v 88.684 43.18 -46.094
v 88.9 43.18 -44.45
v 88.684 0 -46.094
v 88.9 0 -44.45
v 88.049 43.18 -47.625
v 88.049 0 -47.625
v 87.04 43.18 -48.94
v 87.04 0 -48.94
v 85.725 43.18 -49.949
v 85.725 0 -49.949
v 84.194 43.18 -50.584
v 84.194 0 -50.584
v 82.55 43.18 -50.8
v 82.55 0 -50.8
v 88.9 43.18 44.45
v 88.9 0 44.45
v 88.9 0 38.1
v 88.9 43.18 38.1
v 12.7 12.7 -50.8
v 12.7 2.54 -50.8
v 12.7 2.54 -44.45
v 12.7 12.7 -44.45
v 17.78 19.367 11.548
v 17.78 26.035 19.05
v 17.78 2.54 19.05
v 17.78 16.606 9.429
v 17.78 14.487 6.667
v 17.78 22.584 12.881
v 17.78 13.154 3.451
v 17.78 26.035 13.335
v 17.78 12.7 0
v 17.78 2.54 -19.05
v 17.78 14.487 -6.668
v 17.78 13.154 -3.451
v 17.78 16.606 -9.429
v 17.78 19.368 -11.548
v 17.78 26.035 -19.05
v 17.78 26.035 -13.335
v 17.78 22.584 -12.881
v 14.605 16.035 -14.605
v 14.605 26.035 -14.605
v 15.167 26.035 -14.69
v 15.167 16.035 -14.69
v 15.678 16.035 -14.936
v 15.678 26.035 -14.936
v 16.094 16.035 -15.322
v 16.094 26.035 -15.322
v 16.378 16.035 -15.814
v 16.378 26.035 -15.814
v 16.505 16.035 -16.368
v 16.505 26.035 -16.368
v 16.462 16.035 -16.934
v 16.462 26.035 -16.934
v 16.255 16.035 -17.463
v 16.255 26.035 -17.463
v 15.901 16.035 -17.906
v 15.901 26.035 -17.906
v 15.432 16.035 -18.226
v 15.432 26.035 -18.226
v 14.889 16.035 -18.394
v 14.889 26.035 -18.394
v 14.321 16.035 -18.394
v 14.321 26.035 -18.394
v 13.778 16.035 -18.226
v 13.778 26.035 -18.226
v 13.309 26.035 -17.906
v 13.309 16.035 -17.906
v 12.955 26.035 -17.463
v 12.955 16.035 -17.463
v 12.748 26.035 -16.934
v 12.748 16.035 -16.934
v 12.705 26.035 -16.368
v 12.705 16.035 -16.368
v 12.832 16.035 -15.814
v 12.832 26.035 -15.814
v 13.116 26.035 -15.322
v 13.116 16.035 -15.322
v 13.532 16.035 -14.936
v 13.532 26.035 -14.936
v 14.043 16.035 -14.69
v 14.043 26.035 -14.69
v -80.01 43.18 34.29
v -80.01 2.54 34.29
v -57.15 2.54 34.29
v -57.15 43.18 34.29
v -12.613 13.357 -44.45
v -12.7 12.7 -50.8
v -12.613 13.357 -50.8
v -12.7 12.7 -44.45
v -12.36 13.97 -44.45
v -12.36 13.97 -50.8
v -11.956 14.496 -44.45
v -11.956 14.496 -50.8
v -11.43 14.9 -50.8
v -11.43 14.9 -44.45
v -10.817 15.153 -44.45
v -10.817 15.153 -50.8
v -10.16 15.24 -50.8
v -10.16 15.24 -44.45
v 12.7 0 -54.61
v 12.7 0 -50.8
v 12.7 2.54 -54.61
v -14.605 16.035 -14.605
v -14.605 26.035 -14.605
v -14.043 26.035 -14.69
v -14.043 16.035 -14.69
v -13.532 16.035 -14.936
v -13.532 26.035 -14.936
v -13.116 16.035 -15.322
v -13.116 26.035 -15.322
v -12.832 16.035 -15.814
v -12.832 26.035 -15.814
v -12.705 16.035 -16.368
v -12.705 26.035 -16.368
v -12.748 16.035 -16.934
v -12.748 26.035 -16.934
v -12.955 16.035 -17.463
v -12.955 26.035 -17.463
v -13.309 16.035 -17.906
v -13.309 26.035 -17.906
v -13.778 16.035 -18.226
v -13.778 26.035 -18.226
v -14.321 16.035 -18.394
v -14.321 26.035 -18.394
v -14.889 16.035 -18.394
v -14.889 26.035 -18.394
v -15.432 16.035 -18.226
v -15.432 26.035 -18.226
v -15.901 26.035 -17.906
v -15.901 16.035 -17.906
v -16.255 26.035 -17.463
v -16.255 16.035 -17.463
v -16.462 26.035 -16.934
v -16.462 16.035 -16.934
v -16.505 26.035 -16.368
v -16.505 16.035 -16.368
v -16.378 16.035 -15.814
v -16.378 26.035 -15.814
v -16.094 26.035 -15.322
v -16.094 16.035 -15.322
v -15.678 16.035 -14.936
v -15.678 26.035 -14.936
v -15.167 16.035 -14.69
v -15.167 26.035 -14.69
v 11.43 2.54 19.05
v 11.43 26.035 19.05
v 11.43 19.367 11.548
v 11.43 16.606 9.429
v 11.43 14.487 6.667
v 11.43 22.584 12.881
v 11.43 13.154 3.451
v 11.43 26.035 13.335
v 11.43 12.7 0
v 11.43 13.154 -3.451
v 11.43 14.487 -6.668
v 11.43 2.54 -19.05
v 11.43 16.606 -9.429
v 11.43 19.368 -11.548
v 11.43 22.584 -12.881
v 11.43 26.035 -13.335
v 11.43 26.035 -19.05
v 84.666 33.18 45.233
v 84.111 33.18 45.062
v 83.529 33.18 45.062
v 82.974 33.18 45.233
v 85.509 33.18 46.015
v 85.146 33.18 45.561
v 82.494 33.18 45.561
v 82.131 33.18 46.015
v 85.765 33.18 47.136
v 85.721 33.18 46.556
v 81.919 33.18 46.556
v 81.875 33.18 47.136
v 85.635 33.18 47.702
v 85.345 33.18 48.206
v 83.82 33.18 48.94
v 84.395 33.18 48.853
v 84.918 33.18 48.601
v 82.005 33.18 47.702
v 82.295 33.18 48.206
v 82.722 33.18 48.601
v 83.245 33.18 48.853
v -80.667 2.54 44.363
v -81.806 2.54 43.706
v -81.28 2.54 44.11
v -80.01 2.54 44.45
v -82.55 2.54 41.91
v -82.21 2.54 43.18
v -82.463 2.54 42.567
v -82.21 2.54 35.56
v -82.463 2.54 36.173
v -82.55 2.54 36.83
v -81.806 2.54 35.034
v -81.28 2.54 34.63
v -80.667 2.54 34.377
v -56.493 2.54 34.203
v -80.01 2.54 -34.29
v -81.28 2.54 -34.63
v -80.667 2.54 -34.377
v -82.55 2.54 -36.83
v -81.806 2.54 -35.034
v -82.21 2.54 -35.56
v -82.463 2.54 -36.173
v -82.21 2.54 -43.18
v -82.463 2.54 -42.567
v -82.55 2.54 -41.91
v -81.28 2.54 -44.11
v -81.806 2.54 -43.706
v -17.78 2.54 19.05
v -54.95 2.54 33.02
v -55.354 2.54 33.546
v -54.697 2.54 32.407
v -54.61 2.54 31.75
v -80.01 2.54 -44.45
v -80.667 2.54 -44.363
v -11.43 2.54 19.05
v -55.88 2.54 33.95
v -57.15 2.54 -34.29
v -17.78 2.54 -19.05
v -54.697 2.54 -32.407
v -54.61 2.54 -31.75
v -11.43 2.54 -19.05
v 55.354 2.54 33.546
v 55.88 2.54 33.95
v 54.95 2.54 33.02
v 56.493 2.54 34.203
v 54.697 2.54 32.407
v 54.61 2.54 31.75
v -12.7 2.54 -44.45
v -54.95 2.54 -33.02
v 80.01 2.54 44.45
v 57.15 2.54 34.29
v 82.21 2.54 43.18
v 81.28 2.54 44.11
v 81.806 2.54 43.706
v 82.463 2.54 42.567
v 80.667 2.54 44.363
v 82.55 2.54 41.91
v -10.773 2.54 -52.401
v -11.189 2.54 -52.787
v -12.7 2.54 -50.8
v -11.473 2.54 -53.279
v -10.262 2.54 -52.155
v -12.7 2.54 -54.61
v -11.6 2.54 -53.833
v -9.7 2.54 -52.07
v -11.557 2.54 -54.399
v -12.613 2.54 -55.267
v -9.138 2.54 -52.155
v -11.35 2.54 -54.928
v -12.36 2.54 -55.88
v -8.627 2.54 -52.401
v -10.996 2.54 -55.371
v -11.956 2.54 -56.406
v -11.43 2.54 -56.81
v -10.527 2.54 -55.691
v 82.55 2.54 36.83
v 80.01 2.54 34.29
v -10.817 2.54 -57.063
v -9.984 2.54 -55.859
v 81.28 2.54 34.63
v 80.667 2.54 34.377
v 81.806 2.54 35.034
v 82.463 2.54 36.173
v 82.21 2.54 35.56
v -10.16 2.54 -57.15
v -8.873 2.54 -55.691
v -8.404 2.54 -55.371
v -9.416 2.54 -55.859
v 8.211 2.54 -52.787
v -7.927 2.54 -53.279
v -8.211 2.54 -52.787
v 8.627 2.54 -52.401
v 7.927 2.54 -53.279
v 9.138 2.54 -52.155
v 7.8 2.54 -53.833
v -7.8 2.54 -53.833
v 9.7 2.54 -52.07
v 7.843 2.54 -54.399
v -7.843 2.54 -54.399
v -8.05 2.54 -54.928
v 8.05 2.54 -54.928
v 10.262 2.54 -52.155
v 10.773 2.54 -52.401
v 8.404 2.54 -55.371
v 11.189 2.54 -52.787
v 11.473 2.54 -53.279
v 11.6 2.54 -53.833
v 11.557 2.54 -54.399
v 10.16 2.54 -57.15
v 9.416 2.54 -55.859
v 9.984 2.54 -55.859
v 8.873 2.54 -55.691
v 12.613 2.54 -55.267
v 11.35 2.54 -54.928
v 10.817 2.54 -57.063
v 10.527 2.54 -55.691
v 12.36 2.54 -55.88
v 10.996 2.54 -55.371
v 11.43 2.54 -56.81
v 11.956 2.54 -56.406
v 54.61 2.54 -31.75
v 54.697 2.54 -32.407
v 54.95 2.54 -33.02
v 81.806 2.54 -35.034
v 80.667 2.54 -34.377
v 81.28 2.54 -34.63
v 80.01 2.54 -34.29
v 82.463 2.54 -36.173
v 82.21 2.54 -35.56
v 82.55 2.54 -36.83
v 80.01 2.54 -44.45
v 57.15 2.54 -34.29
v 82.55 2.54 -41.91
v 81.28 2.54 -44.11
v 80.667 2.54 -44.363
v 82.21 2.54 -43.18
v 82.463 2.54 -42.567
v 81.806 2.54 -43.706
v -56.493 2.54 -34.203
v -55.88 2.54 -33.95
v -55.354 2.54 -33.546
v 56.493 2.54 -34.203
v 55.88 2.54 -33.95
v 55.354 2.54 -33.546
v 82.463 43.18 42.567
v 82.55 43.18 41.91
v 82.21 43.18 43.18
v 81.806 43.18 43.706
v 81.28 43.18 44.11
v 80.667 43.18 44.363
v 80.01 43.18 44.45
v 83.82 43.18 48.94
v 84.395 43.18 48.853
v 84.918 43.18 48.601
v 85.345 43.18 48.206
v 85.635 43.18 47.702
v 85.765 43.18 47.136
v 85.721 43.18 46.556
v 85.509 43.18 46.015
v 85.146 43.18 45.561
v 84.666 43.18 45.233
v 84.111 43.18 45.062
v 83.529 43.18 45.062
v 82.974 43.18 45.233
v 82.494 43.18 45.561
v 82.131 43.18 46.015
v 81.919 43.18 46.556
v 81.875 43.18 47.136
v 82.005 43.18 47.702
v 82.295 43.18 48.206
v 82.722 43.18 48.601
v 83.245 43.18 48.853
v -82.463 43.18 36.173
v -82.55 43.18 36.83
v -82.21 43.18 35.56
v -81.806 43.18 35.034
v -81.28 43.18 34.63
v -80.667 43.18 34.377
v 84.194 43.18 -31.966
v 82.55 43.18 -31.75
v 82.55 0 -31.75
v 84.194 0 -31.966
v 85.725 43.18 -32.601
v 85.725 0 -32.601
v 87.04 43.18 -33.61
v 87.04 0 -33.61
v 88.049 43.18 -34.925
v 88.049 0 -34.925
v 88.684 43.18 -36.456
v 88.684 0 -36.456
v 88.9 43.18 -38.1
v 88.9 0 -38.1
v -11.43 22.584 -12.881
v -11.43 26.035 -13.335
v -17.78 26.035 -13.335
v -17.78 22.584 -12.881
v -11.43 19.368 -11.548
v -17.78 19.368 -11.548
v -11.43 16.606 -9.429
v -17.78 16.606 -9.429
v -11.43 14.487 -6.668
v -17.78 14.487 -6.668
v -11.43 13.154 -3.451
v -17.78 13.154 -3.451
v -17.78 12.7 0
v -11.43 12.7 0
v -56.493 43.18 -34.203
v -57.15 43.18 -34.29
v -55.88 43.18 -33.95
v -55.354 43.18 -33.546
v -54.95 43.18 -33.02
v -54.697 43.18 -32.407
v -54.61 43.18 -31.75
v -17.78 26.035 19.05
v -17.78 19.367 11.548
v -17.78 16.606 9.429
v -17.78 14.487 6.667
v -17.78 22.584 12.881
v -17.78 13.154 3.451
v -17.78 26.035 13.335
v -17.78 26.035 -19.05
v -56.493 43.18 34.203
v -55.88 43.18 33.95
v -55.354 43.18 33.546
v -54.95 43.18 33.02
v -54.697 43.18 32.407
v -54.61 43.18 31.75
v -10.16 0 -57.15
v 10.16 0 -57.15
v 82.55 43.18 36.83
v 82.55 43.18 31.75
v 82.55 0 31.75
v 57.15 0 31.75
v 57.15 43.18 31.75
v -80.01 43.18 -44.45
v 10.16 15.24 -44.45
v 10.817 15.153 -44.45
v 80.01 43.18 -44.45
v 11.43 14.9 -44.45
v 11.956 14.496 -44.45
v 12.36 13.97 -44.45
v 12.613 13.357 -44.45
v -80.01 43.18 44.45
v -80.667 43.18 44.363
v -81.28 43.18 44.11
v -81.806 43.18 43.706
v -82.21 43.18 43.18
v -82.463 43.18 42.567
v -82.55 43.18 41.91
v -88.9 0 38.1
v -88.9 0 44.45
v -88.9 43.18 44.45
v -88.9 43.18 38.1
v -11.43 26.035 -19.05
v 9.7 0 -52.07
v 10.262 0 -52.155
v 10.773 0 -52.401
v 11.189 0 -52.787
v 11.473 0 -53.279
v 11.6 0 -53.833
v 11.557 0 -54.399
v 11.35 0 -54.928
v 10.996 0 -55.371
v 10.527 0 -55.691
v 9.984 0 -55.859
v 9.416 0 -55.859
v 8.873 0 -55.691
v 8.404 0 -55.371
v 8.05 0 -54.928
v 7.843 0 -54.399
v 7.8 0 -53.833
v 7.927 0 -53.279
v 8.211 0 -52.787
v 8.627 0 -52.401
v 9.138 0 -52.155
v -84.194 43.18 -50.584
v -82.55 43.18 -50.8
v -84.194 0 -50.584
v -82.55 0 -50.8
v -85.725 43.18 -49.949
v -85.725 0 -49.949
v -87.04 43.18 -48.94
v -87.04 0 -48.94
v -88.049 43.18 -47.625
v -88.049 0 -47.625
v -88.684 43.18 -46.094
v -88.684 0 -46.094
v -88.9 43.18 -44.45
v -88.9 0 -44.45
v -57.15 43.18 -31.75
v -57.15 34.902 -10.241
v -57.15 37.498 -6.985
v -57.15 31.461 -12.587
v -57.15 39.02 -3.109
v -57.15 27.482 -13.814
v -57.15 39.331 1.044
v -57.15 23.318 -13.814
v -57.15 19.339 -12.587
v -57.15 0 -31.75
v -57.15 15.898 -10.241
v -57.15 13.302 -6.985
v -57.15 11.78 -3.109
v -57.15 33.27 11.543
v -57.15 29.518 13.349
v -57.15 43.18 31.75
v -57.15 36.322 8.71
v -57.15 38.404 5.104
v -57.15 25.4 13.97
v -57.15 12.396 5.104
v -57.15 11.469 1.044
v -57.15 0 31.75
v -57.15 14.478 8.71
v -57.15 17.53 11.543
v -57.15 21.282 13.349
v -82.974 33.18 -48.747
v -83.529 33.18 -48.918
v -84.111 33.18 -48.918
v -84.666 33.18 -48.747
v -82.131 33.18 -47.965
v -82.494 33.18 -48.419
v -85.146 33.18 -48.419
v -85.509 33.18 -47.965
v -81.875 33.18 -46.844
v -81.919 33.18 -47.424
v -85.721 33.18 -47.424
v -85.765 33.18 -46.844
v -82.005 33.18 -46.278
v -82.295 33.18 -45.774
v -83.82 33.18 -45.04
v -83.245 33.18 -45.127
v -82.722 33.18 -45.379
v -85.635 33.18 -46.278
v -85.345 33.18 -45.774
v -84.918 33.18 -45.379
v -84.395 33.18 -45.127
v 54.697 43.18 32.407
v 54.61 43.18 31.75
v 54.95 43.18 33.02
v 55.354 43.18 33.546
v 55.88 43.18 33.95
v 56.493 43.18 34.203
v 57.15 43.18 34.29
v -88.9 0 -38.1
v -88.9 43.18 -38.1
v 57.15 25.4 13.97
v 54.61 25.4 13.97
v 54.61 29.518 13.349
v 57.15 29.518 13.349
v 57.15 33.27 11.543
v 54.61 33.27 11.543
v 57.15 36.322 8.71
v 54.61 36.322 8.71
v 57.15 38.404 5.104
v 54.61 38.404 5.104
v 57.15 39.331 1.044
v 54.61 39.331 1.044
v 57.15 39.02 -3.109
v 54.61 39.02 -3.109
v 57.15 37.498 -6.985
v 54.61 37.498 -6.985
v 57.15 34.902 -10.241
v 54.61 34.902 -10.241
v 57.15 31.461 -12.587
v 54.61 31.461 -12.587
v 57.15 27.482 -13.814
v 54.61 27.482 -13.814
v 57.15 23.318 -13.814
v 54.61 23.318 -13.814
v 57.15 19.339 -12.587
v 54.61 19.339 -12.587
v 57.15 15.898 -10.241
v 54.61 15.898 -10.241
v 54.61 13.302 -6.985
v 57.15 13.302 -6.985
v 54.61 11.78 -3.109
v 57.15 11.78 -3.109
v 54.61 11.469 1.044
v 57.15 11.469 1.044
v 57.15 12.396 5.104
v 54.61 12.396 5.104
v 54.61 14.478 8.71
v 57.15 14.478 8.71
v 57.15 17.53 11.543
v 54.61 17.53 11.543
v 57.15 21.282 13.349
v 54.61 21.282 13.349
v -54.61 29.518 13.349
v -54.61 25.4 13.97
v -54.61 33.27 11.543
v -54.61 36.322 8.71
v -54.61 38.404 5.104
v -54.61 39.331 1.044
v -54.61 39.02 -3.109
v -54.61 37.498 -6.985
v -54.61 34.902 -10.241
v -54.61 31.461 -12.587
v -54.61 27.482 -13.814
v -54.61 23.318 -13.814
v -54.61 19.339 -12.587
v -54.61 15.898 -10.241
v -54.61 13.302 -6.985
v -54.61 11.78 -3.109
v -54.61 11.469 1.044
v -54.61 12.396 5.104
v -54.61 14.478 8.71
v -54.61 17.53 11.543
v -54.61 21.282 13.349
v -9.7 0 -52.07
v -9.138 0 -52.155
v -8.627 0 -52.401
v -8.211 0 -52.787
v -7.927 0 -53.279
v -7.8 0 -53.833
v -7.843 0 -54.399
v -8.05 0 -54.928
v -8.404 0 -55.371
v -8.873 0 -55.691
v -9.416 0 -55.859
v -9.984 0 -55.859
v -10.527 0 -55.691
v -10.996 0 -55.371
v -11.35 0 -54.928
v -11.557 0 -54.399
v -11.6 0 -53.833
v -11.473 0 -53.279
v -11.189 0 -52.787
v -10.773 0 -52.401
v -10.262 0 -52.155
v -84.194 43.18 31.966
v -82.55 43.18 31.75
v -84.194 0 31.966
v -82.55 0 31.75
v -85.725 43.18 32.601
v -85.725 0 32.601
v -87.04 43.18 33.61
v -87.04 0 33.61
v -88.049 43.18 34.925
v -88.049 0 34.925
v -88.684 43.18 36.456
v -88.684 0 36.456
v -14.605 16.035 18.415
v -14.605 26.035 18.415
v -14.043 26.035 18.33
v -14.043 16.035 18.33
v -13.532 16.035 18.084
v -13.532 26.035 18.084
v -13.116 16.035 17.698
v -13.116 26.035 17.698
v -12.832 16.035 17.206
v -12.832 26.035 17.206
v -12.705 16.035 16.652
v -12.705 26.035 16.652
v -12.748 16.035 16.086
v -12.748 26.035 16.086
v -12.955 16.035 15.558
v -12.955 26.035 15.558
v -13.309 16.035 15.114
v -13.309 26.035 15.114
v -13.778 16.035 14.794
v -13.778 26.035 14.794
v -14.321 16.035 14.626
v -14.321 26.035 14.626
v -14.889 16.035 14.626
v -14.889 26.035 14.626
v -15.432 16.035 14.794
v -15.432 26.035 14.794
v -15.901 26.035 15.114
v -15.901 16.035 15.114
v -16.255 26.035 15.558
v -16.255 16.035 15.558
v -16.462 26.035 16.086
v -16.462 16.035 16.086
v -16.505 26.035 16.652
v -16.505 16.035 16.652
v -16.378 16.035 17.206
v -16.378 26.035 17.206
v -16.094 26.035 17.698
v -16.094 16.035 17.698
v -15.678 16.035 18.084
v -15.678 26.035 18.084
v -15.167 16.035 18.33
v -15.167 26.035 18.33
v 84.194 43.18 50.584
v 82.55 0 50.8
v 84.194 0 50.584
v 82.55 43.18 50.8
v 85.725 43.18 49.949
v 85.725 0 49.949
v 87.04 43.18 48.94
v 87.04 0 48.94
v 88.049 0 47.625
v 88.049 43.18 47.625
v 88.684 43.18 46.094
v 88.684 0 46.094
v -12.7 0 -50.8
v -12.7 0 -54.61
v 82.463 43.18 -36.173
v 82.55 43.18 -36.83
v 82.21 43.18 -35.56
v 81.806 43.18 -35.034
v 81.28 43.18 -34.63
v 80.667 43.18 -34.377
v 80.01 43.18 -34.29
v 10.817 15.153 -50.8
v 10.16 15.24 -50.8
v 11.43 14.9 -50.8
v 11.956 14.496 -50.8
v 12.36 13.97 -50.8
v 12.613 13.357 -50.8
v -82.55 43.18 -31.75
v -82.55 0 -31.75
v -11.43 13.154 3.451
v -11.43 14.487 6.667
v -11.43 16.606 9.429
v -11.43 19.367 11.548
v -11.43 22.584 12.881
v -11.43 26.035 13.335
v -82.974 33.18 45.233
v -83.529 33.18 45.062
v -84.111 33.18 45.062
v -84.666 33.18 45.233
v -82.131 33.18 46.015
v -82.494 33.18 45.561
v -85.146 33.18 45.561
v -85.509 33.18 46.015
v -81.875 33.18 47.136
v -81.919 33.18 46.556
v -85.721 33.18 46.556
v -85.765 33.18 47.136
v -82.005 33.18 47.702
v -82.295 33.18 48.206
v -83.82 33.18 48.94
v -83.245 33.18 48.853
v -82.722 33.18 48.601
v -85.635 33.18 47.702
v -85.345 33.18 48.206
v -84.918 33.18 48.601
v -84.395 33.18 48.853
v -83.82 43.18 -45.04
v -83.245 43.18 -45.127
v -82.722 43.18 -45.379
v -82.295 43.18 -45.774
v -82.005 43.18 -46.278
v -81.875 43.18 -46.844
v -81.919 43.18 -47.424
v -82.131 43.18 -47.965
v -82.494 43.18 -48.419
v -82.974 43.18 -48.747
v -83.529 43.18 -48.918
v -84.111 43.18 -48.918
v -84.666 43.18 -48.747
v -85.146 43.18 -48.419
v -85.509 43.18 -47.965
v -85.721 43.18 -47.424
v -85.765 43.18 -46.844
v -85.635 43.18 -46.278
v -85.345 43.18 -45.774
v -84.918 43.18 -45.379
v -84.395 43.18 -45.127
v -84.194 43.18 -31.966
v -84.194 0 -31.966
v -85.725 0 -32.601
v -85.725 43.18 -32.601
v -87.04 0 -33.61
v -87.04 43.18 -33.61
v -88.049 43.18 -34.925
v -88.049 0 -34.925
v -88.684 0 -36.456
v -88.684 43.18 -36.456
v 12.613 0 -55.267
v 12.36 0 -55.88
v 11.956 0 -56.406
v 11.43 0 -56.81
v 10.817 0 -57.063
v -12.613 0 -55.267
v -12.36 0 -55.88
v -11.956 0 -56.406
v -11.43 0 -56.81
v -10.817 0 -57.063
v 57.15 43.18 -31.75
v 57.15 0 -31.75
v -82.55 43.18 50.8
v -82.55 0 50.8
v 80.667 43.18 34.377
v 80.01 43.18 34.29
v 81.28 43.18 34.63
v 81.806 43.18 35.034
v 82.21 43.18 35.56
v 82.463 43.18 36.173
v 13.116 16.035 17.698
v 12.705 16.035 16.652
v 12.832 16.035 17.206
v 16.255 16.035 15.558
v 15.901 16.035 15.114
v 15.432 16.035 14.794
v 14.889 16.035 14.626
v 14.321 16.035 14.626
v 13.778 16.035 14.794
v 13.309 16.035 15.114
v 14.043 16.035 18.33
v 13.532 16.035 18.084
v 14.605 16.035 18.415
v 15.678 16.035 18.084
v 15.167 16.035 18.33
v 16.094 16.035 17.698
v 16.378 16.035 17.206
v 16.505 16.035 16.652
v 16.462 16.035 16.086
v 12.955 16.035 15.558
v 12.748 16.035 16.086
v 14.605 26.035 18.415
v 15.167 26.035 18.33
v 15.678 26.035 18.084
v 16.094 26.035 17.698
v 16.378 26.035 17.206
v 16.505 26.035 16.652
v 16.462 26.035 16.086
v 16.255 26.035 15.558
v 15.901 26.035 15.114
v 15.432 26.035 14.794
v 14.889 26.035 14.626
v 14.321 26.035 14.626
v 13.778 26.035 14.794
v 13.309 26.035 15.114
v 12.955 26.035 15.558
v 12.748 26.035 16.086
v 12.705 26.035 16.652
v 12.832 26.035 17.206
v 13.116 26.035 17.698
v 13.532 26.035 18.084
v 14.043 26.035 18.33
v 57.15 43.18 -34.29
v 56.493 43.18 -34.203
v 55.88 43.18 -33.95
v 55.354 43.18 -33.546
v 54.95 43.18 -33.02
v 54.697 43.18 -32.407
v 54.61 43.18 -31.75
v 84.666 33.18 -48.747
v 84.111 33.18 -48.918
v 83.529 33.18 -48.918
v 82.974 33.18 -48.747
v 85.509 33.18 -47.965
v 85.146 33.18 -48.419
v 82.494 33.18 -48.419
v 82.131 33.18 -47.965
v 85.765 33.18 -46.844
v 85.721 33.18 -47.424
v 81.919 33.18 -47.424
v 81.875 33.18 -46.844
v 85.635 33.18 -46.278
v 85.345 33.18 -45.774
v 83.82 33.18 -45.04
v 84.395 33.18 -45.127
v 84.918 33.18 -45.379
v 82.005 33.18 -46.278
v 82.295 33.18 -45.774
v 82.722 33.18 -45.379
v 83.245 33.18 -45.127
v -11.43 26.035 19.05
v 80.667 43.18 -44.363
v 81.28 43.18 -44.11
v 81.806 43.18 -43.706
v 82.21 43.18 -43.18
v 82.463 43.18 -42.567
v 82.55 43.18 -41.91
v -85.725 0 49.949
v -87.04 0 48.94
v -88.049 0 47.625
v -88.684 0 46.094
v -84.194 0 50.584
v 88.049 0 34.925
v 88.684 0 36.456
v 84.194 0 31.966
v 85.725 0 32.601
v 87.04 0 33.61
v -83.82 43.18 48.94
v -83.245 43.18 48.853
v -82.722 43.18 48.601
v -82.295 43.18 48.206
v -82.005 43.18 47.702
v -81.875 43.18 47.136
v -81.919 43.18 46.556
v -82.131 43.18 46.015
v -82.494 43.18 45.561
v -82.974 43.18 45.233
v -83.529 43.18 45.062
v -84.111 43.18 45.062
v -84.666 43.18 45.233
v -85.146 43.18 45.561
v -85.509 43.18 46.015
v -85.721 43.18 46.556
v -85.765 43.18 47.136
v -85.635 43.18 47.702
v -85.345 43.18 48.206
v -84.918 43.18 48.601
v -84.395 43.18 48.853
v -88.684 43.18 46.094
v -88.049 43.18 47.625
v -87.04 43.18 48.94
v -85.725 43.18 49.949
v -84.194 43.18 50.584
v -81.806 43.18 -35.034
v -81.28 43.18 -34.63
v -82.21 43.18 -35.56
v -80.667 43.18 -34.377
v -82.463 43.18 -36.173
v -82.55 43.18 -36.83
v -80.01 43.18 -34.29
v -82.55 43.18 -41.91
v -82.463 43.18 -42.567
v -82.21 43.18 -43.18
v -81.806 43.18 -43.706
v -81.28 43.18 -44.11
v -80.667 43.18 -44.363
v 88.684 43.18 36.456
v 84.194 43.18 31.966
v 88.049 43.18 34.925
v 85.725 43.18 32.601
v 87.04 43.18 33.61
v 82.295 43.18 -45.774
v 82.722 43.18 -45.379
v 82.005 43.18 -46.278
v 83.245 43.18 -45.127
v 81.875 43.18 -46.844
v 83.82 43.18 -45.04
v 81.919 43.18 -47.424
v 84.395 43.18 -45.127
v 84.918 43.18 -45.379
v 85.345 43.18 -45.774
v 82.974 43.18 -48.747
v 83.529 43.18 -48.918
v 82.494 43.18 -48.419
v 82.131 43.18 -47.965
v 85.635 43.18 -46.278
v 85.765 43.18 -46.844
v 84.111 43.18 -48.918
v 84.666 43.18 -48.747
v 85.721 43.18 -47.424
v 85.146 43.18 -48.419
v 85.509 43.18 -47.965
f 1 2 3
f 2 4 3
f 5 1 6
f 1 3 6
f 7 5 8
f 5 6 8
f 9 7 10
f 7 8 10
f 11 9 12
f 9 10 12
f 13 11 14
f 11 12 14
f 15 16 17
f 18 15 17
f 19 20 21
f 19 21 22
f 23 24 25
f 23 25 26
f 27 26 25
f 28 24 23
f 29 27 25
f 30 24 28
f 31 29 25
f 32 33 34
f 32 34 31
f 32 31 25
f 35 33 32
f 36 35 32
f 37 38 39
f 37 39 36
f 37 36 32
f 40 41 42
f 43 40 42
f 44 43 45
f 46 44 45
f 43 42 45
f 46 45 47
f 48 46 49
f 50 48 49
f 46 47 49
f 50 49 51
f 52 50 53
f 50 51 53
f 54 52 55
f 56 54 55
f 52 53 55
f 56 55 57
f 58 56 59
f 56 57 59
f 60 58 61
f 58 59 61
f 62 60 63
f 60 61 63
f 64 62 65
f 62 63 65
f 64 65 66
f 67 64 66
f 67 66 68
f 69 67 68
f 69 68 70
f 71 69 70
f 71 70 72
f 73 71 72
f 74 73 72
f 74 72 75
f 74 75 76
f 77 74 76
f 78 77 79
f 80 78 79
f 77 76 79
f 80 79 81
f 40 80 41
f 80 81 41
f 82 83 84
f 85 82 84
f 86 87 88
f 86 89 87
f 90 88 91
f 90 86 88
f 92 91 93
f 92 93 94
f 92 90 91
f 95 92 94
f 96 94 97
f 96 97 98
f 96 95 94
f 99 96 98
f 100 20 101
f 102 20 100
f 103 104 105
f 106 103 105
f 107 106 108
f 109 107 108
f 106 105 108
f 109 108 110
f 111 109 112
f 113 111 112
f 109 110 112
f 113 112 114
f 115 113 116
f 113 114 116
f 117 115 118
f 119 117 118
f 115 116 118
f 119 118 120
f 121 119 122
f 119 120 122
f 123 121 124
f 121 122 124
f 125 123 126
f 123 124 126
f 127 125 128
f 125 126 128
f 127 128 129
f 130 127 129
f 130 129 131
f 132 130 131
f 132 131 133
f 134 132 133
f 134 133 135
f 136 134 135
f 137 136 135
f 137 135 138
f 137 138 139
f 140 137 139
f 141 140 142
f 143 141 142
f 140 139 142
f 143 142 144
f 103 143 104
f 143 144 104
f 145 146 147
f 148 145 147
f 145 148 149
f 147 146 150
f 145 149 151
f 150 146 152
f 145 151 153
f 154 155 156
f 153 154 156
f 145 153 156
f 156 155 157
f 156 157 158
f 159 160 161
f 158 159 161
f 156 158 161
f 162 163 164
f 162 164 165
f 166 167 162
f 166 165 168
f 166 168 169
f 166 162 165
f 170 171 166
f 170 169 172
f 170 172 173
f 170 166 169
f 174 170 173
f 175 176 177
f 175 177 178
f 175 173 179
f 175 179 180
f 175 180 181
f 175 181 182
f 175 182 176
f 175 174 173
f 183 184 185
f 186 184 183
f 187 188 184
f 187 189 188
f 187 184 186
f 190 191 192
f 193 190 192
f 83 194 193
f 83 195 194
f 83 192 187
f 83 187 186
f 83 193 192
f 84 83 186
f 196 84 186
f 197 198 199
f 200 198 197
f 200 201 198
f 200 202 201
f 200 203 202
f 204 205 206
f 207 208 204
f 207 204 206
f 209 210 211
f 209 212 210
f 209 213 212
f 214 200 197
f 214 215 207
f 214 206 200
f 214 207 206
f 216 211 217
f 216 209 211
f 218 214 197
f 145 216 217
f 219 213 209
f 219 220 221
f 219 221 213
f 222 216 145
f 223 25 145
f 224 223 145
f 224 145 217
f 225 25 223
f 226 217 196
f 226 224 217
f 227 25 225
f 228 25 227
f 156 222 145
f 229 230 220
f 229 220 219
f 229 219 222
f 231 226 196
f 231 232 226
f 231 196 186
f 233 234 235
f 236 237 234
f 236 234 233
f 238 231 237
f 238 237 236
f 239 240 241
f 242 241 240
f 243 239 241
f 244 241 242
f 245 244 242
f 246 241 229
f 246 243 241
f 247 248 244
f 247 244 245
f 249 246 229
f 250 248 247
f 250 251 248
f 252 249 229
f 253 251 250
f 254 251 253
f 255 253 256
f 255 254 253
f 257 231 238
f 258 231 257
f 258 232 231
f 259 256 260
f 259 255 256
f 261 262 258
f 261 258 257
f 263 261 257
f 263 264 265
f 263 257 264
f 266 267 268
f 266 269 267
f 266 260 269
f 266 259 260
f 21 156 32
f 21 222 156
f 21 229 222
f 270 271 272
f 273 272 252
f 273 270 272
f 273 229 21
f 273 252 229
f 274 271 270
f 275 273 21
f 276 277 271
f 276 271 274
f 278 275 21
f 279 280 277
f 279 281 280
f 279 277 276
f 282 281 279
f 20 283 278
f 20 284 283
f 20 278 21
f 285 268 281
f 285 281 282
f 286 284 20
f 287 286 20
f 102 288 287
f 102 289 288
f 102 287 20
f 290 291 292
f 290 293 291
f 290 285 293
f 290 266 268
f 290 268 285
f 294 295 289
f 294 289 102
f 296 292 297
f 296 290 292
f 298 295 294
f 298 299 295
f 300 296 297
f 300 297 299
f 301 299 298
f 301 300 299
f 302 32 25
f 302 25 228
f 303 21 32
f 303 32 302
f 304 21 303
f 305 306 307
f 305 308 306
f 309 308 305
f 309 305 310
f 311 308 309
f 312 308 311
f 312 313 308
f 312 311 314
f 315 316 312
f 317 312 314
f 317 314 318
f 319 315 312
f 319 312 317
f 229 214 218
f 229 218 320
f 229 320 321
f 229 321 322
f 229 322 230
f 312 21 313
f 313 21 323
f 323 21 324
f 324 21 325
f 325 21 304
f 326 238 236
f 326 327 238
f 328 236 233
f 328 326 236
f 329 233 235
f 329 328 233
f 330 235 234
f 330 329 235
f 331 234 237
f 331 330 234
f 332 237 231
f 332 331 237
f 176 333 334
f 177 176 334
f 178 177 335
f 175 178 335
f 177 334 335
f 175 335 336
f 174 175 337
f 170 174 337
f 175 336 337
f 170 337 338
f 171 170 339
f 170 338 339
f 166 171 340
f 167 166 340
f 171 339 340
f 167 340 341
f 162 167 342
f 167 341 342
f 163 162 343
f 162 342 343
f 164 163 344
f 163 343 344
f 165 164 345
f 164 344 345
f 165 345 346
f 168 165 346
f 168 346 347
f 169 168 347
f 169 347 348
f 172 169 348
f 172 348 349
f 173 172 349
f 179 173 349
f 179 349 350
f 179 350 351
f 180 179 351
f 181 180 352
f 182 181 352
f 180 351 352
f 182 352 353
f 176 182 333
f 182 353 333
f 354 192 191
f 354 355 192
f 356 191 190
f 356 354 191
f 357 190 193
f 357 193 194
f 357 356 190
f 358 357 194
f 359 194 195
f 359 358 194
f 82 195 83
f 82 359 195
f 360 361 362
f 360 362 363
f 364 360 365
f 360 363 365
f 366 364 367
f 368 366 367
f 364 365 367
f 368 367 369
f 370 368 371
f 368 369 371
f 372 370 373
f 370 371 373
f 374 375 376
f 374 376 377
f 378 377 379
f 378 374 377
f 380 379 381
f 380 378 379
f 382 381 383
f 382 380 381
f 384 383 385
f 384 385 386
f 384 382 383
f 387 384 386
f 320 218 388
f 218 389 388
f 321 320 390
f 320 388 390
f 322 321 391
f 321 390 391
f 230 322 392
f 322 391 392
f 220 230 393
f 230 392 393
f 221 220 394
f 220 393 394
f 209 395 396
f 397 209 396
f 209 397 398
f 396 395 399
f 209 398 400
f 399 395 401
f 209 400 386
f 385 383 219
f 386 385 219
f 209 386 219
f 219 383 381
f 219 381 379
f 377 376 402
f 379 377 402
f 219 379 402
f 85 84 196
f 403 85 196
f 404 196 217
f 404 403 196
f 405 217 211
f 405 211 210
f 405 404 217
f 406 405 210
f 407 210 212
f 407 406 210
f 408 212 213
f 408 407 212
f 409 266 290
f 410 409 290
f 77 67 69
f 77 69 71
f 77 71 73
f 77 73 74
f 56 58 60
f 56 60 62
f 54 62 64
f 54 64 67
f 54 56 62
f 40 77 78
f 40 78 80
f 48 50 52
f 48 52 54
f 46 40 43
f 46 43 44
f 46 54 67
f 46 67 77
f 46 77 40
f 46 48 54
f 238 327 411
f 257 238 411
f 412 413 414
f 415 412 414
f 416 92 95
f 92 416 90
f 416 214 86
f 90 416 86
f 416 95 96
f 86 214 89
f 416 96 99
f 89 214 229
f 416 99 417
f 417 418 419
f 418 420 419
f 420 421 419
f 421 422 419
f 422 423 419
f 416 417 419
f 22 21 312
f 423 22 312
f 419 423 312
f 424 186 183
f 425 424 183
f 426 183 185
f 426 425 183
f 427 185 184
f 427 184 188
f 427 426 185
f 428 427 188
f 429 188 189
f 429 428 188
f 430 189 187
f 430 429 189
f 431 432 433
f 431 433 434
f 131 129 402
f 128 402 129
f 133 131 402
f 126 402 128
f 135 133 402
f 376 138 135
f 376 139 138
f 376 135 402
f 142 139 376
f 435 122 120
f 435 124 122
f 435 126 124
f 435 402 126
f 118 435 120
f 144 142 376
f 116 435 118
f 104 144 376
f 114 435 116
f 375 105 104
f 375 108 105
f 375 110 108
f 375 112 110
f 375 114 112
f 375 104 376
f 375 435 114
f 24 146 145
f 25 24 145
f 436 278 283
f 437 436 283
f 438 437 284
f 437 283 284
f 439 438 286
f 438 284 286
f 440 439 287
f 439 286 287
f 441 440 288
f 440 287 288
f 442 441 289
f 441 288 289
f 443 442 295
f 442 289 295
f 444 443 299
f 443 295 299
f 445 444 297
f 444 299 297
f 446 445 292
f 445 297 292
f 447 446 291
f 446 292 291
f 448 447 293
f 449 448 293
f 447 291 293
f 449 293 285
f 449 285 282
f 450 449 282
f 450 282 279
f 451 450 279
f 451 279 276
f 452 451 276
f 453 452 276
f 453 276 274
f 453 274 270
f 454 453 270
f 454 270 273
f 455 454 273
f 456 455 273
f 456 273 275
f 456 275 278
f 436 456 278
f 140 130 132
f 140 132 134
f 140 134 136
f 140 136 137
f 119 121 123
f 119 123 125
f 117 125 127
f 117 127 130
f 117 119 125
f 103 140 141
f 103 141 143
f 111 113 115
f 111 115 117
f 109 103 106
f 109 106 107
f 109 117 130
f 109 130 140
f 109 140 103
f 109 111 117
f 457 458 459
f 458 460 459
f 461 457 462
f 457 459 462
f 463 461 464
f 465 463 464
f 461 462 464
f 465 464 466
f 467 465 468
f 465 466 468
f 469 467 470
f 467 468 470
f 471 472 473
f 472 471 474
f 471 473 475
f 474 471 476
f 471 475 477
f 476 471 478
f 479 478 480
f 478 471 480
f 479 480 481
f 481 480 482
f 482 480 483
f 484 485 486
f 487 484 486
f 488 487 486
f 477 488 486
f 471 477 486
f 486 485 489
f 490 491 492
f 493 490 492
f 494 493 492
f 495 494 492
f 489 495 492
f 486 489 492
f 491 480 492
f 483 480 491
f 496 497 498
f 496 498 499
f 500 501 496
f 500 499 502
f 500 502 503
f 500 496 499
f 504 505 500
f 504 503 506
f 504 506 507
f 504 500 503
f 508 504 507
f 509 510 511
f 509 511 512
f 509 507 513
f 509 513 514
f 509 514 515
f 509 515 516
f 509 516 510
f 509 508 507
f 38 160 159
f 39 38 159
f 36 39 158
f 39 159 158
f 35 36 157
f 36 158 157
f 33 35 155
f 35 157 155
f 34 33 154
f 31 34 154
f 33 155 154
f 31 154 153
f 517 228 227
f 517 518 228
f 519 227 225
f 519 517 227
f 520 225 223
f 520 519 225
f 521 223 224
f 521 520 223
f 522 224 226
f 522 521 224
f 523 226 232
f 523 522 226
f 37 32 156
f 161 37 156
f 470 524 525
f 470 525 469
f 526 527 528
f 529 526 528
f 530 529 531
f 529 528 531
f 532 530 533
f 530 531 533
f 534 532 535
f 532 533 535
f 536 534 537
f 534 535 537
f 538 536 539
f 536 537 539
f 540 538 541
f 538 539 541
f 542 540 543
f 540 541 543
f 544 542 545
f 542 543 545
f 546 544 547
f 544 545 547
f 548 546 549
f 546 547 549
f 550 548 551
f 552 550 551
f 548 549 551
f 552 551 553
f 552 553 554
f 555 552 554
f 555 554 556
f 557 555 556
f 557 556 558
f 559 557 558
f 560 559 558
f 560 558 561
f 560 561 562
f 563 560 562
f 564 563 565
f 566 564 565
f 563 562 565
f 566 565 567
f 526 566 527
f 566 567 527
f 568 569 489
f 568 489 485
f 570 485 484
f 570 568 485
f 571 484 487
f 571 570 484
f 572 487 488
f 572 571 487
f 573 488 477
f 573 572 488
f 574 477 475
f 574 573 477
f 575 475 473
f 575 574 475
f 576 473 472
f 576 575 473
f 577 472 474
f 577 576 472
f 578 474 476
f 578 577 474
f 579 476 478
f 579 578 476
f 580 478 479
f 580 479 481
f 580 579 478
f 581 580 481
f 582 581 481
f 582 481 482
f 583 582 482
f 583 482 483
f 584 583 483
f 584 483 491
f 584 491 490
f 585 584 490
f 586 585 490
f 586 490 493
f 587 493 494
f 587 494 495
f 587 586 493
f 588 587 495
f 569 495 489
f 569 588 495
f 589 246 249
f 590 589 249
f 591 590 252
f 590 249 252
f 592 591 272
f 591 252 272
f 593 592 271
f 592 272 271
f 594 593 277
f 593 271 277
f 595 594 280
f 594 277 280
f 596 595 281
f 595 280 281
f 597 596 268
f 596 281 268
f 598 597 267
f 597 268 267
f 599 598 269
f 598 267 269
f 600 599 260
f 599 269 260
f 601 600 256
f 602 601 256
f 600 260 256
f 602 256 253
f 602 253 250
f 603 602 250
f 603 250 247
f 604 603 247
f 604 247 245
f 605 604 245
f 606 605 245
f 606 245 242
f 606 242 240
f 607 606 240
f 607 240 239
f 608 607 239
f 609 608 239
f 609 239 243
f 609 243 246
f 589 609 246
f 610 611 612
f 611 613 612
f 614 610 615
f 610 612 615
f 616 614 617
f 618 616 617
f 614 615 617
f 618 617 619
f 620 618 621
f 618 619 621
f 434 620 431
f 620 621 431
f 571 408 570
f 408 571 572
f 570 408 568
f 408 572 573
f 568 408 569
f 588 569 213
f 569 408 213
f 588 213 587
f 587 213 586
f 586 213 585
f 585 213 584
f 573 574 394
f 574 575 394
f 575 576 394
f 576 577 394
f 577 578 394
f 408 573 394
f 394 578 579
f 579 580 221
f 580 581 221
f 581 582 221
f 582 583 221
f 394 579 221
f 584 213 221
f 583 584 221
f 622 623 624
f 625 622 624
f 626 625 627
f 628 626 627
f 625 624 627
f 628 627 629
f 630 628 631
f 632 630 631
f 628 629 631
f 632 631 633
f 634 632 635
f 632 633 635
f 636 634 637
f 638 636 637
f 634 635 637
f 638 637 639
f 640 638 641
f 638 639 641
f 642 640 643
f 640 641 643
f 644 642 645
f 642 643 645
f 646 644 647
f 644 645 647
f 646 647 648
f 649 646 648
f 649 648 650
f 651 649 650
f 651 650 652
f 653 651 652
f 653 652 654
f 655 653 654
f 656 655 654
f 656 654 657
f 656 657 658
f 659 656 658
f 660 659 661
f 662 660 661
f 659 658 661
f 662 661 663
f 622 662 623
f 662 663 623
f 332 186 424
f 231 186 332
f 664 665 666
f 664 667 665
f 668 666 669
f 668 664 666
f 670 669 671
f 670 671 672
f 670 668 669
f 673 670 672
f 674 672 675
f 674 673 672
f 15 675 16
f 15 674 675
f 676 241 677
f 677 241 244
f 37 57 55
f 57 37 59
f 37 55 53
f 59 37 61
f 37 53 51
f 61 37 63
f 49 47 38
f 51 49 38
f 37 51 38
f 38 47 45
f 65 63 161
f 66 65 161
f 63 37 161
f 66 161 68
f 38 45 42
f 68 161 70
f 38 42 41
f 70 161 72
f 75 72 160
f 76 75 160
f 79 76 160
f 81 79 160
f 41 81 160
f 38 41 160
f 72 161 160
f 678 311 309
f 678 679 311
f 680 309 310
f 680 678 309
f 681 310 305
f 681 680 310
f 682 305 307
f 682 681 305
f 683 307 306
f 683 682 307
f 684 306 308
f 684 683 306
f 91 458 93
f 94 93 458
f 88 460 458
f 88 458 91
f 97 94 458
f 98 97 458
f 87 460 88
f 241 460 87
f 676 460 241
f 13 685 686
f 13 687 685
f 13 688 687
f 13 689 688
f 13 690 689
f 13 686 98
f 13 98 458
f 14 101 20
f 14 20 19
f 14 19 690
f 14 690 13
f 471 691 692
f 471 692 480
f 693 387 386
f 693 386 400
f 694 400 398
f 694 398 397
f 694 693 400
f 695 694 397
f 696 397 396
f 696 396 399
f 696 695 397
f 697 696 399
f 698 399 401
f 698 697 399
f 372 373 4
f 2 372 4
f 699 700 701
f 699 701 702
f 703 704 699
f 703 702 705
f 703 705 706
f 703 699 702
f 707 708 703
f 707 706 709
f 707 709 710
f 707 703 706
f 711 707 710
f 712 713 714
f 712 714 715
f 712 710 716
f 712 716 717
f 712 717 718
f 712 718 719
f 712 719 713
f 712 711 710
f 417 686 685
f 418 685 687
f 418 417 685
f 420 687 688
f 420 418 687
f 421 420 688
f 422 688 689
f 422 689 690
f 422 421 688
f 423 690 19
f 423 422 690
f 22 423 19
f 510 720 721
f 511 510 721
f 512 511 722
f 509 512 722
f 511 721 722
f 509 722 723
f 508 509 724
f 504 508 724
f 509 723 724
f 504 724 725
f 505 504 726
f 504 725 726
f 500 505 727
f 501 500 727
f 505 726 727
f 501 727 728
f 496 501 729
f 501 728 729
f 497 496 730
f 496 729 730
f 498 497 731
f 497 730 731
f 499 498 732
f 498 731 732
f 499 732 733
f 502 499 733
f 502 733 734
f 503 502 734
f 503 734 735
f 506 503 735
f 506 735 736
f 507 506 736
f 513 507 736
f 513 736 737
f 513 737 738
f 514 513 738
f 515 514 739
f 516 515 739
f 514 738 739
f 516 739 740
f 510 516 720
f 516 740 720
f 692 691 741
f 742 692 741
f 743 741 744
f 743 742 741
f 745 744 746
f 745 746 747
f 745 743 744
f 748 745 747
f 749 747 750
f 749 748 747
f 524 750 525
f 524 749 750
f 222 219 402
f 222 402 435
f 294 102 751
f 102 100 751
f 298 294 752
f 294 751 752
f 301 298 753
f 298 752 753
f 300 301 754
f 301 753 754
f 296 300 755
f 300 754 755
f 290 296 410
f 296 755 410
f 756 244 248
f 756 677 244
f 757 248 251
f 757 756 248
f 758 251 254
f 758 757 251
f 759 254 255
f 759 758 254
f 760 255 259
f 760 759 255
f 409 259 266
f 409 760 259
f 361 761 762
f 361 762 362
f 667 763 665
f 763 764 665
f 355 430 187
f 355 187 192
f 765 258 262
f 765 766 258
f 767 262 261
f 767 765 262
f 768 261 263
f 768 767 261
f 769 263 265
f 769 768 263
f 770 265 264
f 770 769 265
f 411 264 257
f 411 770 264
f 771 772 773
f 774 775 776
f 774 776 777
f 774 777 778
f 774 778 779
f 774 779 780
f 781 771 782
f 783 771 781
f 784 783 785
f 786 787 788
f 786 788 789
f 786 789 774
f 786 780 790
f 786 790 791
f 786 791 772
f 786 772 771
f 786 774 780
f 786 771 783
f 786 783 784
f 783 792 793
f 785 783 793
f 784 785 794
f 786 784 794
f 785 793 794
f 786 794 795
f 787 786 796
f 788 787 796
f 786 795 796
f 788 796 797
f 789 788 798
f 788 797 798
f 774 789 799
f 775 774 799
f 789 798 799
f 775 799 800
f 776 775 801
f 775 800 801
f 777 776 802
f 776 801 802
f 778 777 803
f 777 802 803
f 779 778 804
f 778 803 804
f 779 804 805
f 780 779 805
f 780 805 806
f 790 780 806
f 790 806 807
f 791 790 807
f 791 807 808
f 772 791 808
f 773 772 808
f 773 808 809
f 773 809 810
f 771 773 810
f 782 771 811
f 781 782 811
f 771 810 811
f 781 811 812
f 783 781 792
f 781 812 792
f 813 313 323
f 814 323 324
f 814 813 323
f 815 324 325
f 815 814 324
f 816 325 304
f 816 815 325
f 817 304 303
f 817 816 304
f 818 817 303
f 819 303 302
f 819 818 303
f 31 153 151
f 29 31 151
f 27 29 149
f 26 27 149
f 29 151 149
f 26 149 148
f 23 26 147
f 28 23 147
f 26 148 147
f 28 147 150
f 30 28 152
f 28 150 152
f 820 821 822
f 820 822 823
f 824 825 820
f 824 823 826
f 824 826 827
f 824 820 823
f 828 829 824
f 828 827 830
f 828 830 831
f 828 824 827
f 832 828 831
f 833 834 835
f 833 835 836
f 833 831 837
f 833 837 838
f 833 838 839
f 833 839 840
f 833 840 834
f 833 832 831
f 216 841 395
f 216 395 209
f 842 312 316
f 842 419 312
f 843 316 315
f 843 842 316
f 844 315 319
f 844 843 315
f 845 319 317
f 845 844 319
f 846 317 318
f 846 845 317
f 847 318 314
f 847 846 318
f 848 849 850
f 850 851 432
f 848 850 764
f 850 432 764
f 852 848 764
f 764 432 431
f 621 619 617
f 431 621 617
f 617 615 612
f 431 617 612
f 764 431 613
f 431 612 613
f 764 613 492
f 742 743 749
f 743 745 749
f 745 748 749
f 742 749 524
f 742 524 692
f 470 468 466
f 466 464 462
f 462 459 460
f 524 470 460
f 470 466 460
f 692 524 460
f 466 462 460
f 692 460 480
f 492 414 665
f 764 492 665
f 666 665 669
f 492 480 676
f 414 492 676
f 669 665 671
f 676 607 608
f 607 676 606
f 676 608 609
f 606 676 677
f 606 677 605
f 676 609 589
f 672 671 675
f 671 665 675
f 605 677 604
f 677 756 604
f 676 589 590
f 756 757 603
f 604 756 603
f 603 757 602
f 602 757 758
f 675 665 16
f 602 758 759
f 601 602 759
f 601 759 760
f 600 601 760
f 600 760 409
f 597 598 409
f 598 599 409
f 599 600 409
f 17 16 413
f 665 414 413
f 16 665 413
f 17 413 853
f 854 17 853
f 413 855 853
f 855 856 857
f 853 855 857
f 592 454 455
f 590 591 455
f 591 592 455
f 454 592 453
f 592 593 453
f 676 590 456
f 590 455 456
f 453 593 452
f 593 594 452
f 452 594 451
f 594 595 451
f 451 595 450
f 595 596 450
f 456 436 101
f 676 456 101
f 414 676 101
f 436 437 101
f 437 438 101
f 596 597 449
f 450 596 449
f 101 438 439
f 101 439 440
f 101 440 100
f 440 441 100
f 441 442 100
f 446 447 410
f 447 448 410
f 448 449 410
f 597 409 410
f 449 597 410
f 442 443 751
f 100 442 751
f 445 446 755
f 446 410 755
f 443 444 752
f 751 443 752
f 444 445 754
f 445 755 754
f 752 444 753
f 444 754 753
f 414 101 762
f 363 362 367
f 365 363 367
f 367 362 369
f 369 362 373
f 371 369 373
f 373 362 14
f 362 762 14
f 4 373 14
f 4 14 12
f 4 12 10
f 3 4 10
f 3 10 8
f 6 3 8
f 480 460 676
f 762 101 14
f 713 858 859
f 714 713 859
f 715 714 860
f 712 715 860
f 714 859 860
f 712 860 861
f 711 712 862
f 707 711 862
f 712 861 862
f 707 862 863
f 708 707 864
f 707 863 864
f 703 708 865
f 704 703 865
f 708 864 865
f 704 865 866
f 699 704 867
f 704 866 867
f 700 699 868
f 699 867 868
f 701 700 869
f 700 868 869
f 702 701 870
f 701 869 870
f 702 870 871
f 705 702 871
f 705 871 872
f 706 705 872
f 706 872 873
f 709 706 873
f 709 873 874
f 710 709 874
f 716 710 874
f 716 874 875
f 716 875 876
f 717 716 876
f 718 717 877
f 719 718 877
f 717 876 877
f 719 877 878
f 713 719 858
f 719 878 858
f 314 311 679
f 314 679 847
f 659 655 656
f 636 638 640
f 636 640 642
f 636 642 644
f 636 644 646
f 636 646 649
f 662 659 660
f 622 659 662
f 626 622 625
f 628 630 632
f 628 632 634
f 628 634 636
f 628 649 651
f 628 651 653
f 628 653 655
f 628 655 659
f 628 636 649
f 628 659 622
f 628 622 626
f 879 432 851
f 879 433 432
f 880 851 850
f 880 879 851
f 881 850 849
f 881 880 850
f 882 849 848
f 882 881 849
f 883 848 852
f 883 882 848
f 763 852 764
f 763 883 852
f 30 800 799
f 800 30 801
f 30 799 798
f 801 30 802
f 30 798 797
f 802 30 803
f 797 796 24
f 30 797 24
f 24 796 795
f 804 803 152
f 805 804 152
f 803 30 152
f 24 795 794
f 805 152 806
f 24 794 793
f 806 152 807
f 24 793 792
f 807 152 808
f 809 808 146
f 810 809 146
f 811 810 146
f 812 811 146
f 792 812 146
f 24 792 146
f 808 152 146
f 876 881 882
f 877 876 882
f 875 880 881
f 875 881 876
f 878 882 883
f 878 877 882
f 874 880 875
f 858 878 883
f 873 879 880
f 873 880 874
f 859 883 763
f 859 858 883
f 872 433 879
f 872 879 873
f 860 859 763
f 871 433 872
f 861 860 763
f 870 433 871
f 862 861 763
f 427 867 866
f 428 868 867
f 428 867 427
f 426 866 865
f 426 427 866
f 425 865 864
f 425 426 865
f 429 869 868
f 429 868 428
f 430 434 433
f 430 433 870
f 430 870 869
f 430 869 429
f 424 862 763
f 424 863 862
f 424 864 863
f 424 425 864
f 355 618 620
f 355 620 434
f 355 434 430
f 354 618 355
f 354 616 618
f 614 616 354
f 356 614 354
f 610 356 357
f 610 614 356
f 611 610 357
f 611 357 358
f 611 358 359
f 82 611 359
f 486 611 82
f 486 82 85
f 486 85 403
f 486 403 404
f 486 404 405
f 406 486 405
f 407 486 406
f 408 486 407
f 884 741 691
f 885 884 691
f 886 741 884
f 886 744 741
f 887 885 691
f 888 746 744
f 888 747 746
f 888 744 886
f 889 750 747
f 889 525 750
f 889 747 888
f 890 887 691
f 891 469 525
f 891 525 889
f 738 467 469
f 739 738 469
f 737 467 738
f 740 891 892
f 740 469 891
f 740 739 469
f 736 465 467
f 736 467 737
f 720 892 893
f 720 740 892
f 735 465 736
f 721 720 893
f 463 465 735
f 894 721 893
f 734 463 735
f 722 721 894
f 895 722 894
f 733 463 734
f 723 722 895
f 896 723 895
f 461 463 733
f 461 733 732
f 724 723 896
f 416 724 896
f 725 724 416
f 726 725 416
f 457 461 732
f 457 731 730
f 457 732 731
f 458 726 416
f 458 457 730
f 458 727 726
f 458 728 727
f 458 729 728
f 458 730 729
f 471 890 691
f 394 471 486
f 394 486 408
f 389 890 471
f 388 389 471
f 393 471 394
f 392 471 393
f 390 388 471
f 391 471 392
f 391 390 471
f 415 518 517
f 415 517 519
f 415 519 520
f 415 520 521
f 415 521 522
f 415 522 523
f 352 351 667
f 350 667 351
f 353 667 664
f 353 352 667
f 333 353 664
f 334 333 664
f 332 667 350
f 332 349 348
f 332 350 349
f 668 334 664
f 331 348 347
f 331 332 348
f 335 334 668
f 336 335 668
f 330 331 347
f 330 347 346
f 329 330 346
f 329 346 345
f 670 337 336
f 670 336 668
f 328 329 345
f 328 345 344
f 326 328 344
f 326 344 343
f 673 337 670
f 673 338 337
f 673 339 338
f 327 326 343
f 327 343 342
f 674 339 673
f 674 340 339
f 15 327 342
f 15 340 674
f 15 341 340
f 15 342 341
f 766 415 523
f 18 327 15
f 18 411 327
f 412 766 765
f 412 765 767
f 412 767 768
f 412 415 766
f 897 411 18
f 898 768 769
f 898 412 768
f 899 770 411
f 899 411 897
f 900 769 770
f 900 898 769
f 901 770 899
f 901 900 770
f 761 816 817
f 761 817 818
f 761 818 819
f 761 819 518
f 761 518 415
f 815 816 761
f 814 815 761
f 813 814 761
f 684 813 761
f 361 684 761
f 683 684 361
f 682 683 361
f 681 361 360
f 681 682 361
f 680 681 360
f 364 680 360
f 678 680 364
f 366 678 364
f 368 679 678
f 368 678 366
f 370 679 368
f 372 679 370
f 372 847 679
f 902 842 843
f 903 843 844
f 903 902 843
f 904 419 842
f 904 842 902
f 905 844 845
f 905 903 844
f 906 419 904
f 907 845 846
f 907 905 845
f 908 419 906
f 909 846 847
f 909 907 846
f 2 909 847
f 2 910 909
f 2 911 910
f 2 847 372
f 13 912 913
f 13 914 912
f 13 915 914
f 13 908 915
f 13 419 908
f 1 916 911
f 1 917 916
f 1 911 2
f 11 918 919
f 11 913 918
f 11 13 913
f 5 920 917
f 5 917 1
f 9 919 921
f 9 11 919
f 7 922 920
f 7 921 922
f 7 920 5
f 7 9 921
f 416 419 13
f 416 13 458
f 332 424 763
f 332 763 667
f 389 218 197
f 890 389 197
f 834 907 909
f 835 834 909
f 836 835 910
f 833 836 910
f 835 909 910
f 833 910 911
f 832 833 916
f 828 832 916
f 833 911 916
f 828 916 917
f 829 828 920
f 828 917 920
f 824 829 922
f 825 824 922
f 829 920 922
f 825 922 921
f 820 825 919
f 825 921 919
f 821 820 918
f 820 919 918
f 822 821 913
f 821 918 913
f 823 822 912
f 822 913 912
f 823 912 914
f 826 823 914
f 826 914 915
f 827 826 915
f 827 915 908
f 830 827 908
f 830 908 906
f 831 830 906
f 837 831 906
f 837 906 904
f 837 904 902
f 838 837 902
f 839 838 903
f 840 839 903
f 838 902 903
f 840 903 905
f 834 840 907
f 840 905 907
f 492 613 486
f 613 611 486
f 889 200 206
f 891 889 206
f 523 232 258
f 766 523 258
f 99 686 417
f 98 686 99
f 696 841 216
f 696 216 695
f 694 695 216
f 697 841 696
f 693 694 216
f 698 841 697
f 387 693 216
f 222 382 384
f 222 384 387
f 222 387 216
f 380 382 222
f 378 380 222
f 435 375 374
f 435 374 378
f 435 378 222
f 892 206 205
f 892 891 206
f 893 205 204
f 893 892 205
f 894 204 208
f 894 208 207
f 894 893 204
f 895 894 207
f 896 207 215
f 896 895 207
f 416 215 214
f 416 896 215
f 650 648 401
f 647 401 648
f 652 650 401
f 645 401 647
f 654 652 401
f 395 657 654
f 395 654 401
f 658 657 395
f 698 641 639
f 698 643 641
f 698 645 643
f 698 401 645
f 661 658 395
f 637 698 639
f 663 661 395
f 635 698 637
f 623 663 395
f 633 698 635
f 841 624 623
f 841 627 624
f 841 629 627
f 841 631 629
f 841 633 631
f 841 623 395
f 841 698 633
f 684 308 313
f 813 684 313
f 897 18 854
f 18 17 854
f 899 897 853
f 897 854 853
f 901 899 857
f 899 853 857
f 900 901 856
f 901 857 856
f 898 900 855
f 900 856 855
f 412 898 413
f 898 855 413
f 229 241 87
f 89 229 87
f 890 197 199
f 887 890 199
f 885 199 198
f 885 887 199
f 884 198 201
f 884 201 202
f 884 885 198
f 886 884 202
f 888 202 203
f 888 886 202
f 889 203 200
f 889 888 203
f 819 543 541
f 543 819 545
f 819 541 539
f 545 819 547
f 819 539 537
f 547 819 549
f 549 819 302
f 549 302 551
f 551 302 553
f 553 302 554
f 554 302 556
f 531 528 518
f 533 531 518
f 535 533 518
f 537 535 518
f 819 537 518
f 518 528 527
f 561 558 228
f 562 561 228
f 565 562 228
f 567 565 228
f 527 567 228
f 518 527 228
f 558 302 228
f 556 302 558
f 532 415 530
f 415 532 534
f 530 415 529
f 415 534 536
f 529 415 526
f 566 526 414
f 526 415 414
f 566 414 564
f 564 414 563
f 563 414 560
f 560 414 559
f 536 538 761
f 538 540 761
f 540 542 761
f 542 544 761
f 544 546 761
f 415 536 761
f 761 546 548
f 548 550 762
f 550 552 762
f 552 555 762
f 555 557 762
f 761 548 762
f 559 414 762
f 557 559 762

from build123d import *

# Parameters (mm, degrees)
SKETCH1_W           = 177.8
SKETCH1_H           = 101.6
BOSS_EXTRUDE1_DEPTH = 2.54
SKETCH2_W           = 25.4
SKETCH2_H           = 63.5
CUT_EXTRUDE1_DEPTH  = 2.54
SKETCH3_W           = 177.8
SKETCH3_H           = 101.6
SKETCH3_W_2         = 165.1
SKETCH3_H_2         = 88.9
BOSS_EXTRUDE2_DEPTH = 40.64
BOSS_EXTRUDE3_DEPTH = 40.64
SKETCH8_W           = 6.35
SKETCH8_H           = 38.1
BOSS_EXTRUDE4_DEPTH = 10.16
BOSS_EXTRUDE5_DEPTH = 6.35
SKETCH10_W          = 6.35
SKETCH10_H          = 63.5
CUT_EXTRUDE2_DEPTH  = 107.696
SKETCH11_R          = 13.97
CUT_EXTRUDE5_DEPTH  = 2.54
FILLET1_R           = 6.35
FILLET2_R           = 2.54
SKETCH14_W          = 25.4
SKETCH14_H          = 6.35
BOSS_EXTRUDE6_DEPTH = 2.54
SKETCH15_R          = 1.905
CUT_EXTRUDE6_DEPTH  = 8.636
FILLET3_R           = 2.54
SKETCH16_R          = 1.95
CUT_EXTRUDE7_DEPTH  = 10
SKETCH17_R          = 1.905
CUT_EXTRUDE8_DEPTH  = 10
SKETCH18_W          = 25.4
SKETCH18_H          = 12.7
CUT_EXTRUDE9_DEPTH  = 10
FILLET4_R           = 2.54


with BuildPart() as part:
    # Sketch1 → Boss-Extrude1 (new body)
    with BuildSketch(Plane(origin=(0, 0, 0), x_dir=(1, 0, 0), z_dir=(0, 1, 0))):
        Rectangle(SKETCH1_W, SKETCH1_H)
    extrude(amount=BOSS_EXTRUDE1_DEPTH)

    # Sketch2 → Cut-Extrude1 (cut)
    with BuildSketch(Plane(origin=(0, 2.54, 0), x_dir=(1, 0, 0), z_dir=(0, 1, 0))):
        with Locations((-69.85, 0)):
            Rectangle(SKETCH2_W, SKETCH2_H)
        with Locations((69.85, 0)):
            Rectangle(SKETCH2_W, SKETCH2_H)
    extrude(amount=-CUT_EXTRUDE1_DEPTH, mode=Mode.SUBTRACT)

    # Sketch3 → Boss-Extrude2 (add)
    with BuildSketch(Plane(origin=(0, 2.54, 0), x_dir=(1, 0, 0), z_dir=(0, 1, 0))):
        Rectangle(SKETCH3_W, SKETCH3_H)
        Rectangle(SKETCH3_W_2, SKETCH3_H_2, mode=Mode.SUBTRACT)
    extrude(amount=BOSS_EXTRUDE2_DEPTH)

    # Sketch7 → Boss-Extrude3 (add)
    with BuildSketch(Plane(origin=(0, 2.54, 0), x_dir=(1, 0, 0), z_dir=(0, 1, 0))):
        Polygon((-54.61, 34.29), (-82.55, 34.29), (-82.55, 31.75), (-57.15, 31.75), (-57.15, -31.75), (-82.55, -31.75), (-82.55, -34.29), (-54.61, -34.29), align=None)
        Polygon((82.55, 34.29), (54.61, 34.29), (54.61, -34.29), (82.55, -34.29), (82.55, -31.75), (57.15, -31.75), (57.15, 31.75), (82.55, 31.75), align=None)
    extrude(amount=BOSS_EXTRUDE3_DEPTH)

    # Sketch8 → Boss-Extrude4 (add)
    with BuildSketch(Plane(origin=(0, 2.54, 0), x_dir=(1, 0, 0), z_dir=(0, 1, 0))):
        with Locations((-14.605, 0)):
            Rectangle(SKETCH8_W, SKETCH8_H)
    boss_extrude4 = extrude(amount=BOSS_EXTRUDE4_DEPTH)

    # Sketch9 → Boss-Extrude5 (add)
    with BuildSketch(Plane(origin=(-11.43, 0, 0), x_dir=(0, 0, -1), z_dir=(1, 0, 0))):
        with BuildLine():
            Line((-19.05, 26.035), (-19.05, 12.7))
            Line((-19.05, 12.7), (7e-09, 12.7))
            ThreePointArc((7e-09, 12.7), (-9.429268925, 16.60573107), (-13.335, 26.035))
            Line((-13.335, 26.035), (-19.05, 26.035))
        make_face()
        with BuildLine():
            ThreePointArc((13.335, 26.035), (9.42926893, 16.605731075), (7e-09, 12.7))
            Line((7e-09, 12.7), (19.05, 12.7))
            Line((19.05, 12.7), (19.05, 26.035))
            Line((19.05, 26.035), (13.335, 26.035))
        make_face()
    boss_extrude5 = extrude(amount=-BOSS_EXTRUDE5_DEPTH)

    # Sketch10 → Cut-Extrude2 (cut)
    with BuildSketch(Plane(origin=(0, 43.18, 0), x_dir=(1, 0, 0), z_dir=(0, 1, 0))):
        with Locations((-85.725, 0)):
            Rectangle(SKETCH10_W, SKETCH10_H)
        with Locations((85.725, 0)):
            Rectangle(SKETCH10_W, SKETCH10_H)
    extrude(amount=-CUT_EXTRUDE2_DEPTH, mode=Mode.SUBTRACT)

    # Mirror1: Boss-Extrude4, Boss-Extrude5 across plane
    add(boss_extrude4.mirror(Plane(origin=(0, 0, 0), x_dir=(0, 0, 1), z_dir=(1, 0, 0))))
    add(boss_extrude5.mirror(Plane(origin=(0, 0, 0), x_dir=(0, 0, 1), z_dir=(1, 0, 0))))

    # Sketch11 → Cut-Extrude5 (cut)
    with BuildSketch(Plane.ZY.offset(-54.61)):
        with Locations((0, 25.4)):
            Circle(SKETCH11_R)
    cut_extrude5 = extrude(amount=-CUT_EXTRUDE5_DEPTH, mode=Mode.SUBTRACT)

    # Mirror2: Cut-Extrude5 across plane
    add(cut_extrude5.mirror(Plane(origin=(0, 0, 0), x_dir=(0, 0, 1), z_dir=(1, 0, 0))), mode=Mode.SUBTRACT)

    # Fillet1
    fillet1_edges = [part.edges().sort_by_distance(p)[0] for p in [
        (-88.9, 21.59, 31.75),
        (-88.9, 21.59, -31.75),
        (88.9, 21.59, -31.75),
        (88.9, 21.59, 31.75),
        (88.9, 21.59, 50.8),
        (-88.9, 21.59, 50.8),
        (-88.9, 21.59, -50.8),
        (88.9, 21.59, -50.8),
    ]]
    fillet(fillet1_edges, radius=FILLET1_R)

    # Fillet2
    fillet2_edges = [part.edges().sort_by_distance(p)[0] for p in [
        (82.55, 22.86, -34.29),
        (-82.55, 22.86, 44.45),
        (82.55, 22.86, 44.45),
        (82.55, 22.86, -44.45),
        (-82.55, 22.86, -44.45),
        (-54.61, 22.86, 34.29),
        (-54.61, 22.86, -34.29),
        (-82.55, 22.86, -34.29),
        (-82.55, 22.86, 34.29),
        (54.61, 22.86, -34.29),
        (54.61, 22.86, 34.29),
        (82.55, 22.86, 34.29),
    ]]
    fillet(fillet2_edges, radius=FILLET2_R)

    # Sketch14 → Boss-Extrude6 (add)
    with BuildSketch(Plane(origin=(0, 2.54, 0), x_dir=(1, 0, 0), z_dir=(0, 1, 0))):
        with Locations((0, 53.975)):
            Rectangle(SKETCH14_W, SKETCH14_H)
    extrude(amount=-BOSS_EXTRUDE6_DEPTH)

    # Sketch15 → Cut-Extrude6 (cut)
    with BuildSketch(Plane(origin=(0, 2.54, 0), x_dir=(1, 0, 0), z_dir=(0, 1, 0))):
        with Locations(Location((-9.7, 53.975, 0), (0, 0, 270))):
            Circle(SKETCH15_R)
        with Locations(Location((9.7, 53.975, 0), (0, 0, 270))):
            Circle(SKETCH15_R)
    extrude(amount=-CUT_EXTRUDE6_DEPTH, mode=Mode.SUBTRACT)

    # Fillet3
    fillet3_edges = [part.edges().sort_by_distance(p)[0] for p in [
        (-12.7, 1.27, -57.15),
        (12.7, 1.27, -57.15),
    ]]
    fillet(fillet3_edges, radius=FILLET3_R)

    # Sketch16 → Cut-Extrude7 (cut)
    with BuildSketch(Plane(origin=(0, 43.18, 0), x_dir=(1, 0, 0), z_dir=(0, 1, 0))):
        with Locations(Location((-83.82, 46.99, 0), (0, 0, 270))):
            Circle(SKETCH16_R)
        with Locations(Location((83.82, 46.99, 0), (0, 0, 270))):
            Circle(SKETCH16_R)
        with Locations(Location((83.82, -46.99, 0), (0, 0, 270))):
            Circle(SKETCH16_R)
        with Locations(Location((-83.82, -46.99, 0), (0, 0, 270))):
            Circle(SKETCH16_R)
    extrude(amount=-CUT_EXTRUDE7_DEPTH, mode=Mode.SUBTRACT)

    # Sketch17 → Cut-Extrude8 (cut)
    with BuildSketch(Plane(origin=(0, 26.035, 0), x_dir=(1, 0, 0), z_dir=(0, 1, 0))):
        with Locations(Location((-14.605, 16.51, 0), (0, 0, 270))):
            Circle(SKETCH17_R)
        with Locations(Location((14.605, 16.51, 0), (0, 0, 270))):
            Circle(SKETCH17_R)
        with Locations(Location((14.605, -16.51, 0), (0, 0, 270))):
            Circle(SKETCH17_R)
        with Locations(Location((-14.605, -16.51, 0), (0, 0, 270))):
            Circle(SKETCH17_R)
    extrude(amount=-CUT_EXTRUDE8_DEPTH, mode=Mode.SUBTRACT)

    # Sketch18 → Cut-Extrude9 (cut)
    with BuildSketch(Plane(origin=(0, 0, -50.8), x_dir=(-1, 0, 0), z_dir=(0, 0, -1))):
        with Locations((0, 8.89)):
            Rectangle(SKETCH18_W, SKETCH18_H)
    extrude(amount=-CUT_EXTRUDE9_DEPTH, mode=Mode.SUBTRACT)

    # Fillet4
    fillet4_edges = [part.edges().sort_by_distance(p)[0] for p in [
        (12.7, 15.24, -47.625),
        (-12.7, 15.24, -47.625),
    ]]
    fillet(fillet4_edges, radius=FILLET4_R)


solid = part.part
